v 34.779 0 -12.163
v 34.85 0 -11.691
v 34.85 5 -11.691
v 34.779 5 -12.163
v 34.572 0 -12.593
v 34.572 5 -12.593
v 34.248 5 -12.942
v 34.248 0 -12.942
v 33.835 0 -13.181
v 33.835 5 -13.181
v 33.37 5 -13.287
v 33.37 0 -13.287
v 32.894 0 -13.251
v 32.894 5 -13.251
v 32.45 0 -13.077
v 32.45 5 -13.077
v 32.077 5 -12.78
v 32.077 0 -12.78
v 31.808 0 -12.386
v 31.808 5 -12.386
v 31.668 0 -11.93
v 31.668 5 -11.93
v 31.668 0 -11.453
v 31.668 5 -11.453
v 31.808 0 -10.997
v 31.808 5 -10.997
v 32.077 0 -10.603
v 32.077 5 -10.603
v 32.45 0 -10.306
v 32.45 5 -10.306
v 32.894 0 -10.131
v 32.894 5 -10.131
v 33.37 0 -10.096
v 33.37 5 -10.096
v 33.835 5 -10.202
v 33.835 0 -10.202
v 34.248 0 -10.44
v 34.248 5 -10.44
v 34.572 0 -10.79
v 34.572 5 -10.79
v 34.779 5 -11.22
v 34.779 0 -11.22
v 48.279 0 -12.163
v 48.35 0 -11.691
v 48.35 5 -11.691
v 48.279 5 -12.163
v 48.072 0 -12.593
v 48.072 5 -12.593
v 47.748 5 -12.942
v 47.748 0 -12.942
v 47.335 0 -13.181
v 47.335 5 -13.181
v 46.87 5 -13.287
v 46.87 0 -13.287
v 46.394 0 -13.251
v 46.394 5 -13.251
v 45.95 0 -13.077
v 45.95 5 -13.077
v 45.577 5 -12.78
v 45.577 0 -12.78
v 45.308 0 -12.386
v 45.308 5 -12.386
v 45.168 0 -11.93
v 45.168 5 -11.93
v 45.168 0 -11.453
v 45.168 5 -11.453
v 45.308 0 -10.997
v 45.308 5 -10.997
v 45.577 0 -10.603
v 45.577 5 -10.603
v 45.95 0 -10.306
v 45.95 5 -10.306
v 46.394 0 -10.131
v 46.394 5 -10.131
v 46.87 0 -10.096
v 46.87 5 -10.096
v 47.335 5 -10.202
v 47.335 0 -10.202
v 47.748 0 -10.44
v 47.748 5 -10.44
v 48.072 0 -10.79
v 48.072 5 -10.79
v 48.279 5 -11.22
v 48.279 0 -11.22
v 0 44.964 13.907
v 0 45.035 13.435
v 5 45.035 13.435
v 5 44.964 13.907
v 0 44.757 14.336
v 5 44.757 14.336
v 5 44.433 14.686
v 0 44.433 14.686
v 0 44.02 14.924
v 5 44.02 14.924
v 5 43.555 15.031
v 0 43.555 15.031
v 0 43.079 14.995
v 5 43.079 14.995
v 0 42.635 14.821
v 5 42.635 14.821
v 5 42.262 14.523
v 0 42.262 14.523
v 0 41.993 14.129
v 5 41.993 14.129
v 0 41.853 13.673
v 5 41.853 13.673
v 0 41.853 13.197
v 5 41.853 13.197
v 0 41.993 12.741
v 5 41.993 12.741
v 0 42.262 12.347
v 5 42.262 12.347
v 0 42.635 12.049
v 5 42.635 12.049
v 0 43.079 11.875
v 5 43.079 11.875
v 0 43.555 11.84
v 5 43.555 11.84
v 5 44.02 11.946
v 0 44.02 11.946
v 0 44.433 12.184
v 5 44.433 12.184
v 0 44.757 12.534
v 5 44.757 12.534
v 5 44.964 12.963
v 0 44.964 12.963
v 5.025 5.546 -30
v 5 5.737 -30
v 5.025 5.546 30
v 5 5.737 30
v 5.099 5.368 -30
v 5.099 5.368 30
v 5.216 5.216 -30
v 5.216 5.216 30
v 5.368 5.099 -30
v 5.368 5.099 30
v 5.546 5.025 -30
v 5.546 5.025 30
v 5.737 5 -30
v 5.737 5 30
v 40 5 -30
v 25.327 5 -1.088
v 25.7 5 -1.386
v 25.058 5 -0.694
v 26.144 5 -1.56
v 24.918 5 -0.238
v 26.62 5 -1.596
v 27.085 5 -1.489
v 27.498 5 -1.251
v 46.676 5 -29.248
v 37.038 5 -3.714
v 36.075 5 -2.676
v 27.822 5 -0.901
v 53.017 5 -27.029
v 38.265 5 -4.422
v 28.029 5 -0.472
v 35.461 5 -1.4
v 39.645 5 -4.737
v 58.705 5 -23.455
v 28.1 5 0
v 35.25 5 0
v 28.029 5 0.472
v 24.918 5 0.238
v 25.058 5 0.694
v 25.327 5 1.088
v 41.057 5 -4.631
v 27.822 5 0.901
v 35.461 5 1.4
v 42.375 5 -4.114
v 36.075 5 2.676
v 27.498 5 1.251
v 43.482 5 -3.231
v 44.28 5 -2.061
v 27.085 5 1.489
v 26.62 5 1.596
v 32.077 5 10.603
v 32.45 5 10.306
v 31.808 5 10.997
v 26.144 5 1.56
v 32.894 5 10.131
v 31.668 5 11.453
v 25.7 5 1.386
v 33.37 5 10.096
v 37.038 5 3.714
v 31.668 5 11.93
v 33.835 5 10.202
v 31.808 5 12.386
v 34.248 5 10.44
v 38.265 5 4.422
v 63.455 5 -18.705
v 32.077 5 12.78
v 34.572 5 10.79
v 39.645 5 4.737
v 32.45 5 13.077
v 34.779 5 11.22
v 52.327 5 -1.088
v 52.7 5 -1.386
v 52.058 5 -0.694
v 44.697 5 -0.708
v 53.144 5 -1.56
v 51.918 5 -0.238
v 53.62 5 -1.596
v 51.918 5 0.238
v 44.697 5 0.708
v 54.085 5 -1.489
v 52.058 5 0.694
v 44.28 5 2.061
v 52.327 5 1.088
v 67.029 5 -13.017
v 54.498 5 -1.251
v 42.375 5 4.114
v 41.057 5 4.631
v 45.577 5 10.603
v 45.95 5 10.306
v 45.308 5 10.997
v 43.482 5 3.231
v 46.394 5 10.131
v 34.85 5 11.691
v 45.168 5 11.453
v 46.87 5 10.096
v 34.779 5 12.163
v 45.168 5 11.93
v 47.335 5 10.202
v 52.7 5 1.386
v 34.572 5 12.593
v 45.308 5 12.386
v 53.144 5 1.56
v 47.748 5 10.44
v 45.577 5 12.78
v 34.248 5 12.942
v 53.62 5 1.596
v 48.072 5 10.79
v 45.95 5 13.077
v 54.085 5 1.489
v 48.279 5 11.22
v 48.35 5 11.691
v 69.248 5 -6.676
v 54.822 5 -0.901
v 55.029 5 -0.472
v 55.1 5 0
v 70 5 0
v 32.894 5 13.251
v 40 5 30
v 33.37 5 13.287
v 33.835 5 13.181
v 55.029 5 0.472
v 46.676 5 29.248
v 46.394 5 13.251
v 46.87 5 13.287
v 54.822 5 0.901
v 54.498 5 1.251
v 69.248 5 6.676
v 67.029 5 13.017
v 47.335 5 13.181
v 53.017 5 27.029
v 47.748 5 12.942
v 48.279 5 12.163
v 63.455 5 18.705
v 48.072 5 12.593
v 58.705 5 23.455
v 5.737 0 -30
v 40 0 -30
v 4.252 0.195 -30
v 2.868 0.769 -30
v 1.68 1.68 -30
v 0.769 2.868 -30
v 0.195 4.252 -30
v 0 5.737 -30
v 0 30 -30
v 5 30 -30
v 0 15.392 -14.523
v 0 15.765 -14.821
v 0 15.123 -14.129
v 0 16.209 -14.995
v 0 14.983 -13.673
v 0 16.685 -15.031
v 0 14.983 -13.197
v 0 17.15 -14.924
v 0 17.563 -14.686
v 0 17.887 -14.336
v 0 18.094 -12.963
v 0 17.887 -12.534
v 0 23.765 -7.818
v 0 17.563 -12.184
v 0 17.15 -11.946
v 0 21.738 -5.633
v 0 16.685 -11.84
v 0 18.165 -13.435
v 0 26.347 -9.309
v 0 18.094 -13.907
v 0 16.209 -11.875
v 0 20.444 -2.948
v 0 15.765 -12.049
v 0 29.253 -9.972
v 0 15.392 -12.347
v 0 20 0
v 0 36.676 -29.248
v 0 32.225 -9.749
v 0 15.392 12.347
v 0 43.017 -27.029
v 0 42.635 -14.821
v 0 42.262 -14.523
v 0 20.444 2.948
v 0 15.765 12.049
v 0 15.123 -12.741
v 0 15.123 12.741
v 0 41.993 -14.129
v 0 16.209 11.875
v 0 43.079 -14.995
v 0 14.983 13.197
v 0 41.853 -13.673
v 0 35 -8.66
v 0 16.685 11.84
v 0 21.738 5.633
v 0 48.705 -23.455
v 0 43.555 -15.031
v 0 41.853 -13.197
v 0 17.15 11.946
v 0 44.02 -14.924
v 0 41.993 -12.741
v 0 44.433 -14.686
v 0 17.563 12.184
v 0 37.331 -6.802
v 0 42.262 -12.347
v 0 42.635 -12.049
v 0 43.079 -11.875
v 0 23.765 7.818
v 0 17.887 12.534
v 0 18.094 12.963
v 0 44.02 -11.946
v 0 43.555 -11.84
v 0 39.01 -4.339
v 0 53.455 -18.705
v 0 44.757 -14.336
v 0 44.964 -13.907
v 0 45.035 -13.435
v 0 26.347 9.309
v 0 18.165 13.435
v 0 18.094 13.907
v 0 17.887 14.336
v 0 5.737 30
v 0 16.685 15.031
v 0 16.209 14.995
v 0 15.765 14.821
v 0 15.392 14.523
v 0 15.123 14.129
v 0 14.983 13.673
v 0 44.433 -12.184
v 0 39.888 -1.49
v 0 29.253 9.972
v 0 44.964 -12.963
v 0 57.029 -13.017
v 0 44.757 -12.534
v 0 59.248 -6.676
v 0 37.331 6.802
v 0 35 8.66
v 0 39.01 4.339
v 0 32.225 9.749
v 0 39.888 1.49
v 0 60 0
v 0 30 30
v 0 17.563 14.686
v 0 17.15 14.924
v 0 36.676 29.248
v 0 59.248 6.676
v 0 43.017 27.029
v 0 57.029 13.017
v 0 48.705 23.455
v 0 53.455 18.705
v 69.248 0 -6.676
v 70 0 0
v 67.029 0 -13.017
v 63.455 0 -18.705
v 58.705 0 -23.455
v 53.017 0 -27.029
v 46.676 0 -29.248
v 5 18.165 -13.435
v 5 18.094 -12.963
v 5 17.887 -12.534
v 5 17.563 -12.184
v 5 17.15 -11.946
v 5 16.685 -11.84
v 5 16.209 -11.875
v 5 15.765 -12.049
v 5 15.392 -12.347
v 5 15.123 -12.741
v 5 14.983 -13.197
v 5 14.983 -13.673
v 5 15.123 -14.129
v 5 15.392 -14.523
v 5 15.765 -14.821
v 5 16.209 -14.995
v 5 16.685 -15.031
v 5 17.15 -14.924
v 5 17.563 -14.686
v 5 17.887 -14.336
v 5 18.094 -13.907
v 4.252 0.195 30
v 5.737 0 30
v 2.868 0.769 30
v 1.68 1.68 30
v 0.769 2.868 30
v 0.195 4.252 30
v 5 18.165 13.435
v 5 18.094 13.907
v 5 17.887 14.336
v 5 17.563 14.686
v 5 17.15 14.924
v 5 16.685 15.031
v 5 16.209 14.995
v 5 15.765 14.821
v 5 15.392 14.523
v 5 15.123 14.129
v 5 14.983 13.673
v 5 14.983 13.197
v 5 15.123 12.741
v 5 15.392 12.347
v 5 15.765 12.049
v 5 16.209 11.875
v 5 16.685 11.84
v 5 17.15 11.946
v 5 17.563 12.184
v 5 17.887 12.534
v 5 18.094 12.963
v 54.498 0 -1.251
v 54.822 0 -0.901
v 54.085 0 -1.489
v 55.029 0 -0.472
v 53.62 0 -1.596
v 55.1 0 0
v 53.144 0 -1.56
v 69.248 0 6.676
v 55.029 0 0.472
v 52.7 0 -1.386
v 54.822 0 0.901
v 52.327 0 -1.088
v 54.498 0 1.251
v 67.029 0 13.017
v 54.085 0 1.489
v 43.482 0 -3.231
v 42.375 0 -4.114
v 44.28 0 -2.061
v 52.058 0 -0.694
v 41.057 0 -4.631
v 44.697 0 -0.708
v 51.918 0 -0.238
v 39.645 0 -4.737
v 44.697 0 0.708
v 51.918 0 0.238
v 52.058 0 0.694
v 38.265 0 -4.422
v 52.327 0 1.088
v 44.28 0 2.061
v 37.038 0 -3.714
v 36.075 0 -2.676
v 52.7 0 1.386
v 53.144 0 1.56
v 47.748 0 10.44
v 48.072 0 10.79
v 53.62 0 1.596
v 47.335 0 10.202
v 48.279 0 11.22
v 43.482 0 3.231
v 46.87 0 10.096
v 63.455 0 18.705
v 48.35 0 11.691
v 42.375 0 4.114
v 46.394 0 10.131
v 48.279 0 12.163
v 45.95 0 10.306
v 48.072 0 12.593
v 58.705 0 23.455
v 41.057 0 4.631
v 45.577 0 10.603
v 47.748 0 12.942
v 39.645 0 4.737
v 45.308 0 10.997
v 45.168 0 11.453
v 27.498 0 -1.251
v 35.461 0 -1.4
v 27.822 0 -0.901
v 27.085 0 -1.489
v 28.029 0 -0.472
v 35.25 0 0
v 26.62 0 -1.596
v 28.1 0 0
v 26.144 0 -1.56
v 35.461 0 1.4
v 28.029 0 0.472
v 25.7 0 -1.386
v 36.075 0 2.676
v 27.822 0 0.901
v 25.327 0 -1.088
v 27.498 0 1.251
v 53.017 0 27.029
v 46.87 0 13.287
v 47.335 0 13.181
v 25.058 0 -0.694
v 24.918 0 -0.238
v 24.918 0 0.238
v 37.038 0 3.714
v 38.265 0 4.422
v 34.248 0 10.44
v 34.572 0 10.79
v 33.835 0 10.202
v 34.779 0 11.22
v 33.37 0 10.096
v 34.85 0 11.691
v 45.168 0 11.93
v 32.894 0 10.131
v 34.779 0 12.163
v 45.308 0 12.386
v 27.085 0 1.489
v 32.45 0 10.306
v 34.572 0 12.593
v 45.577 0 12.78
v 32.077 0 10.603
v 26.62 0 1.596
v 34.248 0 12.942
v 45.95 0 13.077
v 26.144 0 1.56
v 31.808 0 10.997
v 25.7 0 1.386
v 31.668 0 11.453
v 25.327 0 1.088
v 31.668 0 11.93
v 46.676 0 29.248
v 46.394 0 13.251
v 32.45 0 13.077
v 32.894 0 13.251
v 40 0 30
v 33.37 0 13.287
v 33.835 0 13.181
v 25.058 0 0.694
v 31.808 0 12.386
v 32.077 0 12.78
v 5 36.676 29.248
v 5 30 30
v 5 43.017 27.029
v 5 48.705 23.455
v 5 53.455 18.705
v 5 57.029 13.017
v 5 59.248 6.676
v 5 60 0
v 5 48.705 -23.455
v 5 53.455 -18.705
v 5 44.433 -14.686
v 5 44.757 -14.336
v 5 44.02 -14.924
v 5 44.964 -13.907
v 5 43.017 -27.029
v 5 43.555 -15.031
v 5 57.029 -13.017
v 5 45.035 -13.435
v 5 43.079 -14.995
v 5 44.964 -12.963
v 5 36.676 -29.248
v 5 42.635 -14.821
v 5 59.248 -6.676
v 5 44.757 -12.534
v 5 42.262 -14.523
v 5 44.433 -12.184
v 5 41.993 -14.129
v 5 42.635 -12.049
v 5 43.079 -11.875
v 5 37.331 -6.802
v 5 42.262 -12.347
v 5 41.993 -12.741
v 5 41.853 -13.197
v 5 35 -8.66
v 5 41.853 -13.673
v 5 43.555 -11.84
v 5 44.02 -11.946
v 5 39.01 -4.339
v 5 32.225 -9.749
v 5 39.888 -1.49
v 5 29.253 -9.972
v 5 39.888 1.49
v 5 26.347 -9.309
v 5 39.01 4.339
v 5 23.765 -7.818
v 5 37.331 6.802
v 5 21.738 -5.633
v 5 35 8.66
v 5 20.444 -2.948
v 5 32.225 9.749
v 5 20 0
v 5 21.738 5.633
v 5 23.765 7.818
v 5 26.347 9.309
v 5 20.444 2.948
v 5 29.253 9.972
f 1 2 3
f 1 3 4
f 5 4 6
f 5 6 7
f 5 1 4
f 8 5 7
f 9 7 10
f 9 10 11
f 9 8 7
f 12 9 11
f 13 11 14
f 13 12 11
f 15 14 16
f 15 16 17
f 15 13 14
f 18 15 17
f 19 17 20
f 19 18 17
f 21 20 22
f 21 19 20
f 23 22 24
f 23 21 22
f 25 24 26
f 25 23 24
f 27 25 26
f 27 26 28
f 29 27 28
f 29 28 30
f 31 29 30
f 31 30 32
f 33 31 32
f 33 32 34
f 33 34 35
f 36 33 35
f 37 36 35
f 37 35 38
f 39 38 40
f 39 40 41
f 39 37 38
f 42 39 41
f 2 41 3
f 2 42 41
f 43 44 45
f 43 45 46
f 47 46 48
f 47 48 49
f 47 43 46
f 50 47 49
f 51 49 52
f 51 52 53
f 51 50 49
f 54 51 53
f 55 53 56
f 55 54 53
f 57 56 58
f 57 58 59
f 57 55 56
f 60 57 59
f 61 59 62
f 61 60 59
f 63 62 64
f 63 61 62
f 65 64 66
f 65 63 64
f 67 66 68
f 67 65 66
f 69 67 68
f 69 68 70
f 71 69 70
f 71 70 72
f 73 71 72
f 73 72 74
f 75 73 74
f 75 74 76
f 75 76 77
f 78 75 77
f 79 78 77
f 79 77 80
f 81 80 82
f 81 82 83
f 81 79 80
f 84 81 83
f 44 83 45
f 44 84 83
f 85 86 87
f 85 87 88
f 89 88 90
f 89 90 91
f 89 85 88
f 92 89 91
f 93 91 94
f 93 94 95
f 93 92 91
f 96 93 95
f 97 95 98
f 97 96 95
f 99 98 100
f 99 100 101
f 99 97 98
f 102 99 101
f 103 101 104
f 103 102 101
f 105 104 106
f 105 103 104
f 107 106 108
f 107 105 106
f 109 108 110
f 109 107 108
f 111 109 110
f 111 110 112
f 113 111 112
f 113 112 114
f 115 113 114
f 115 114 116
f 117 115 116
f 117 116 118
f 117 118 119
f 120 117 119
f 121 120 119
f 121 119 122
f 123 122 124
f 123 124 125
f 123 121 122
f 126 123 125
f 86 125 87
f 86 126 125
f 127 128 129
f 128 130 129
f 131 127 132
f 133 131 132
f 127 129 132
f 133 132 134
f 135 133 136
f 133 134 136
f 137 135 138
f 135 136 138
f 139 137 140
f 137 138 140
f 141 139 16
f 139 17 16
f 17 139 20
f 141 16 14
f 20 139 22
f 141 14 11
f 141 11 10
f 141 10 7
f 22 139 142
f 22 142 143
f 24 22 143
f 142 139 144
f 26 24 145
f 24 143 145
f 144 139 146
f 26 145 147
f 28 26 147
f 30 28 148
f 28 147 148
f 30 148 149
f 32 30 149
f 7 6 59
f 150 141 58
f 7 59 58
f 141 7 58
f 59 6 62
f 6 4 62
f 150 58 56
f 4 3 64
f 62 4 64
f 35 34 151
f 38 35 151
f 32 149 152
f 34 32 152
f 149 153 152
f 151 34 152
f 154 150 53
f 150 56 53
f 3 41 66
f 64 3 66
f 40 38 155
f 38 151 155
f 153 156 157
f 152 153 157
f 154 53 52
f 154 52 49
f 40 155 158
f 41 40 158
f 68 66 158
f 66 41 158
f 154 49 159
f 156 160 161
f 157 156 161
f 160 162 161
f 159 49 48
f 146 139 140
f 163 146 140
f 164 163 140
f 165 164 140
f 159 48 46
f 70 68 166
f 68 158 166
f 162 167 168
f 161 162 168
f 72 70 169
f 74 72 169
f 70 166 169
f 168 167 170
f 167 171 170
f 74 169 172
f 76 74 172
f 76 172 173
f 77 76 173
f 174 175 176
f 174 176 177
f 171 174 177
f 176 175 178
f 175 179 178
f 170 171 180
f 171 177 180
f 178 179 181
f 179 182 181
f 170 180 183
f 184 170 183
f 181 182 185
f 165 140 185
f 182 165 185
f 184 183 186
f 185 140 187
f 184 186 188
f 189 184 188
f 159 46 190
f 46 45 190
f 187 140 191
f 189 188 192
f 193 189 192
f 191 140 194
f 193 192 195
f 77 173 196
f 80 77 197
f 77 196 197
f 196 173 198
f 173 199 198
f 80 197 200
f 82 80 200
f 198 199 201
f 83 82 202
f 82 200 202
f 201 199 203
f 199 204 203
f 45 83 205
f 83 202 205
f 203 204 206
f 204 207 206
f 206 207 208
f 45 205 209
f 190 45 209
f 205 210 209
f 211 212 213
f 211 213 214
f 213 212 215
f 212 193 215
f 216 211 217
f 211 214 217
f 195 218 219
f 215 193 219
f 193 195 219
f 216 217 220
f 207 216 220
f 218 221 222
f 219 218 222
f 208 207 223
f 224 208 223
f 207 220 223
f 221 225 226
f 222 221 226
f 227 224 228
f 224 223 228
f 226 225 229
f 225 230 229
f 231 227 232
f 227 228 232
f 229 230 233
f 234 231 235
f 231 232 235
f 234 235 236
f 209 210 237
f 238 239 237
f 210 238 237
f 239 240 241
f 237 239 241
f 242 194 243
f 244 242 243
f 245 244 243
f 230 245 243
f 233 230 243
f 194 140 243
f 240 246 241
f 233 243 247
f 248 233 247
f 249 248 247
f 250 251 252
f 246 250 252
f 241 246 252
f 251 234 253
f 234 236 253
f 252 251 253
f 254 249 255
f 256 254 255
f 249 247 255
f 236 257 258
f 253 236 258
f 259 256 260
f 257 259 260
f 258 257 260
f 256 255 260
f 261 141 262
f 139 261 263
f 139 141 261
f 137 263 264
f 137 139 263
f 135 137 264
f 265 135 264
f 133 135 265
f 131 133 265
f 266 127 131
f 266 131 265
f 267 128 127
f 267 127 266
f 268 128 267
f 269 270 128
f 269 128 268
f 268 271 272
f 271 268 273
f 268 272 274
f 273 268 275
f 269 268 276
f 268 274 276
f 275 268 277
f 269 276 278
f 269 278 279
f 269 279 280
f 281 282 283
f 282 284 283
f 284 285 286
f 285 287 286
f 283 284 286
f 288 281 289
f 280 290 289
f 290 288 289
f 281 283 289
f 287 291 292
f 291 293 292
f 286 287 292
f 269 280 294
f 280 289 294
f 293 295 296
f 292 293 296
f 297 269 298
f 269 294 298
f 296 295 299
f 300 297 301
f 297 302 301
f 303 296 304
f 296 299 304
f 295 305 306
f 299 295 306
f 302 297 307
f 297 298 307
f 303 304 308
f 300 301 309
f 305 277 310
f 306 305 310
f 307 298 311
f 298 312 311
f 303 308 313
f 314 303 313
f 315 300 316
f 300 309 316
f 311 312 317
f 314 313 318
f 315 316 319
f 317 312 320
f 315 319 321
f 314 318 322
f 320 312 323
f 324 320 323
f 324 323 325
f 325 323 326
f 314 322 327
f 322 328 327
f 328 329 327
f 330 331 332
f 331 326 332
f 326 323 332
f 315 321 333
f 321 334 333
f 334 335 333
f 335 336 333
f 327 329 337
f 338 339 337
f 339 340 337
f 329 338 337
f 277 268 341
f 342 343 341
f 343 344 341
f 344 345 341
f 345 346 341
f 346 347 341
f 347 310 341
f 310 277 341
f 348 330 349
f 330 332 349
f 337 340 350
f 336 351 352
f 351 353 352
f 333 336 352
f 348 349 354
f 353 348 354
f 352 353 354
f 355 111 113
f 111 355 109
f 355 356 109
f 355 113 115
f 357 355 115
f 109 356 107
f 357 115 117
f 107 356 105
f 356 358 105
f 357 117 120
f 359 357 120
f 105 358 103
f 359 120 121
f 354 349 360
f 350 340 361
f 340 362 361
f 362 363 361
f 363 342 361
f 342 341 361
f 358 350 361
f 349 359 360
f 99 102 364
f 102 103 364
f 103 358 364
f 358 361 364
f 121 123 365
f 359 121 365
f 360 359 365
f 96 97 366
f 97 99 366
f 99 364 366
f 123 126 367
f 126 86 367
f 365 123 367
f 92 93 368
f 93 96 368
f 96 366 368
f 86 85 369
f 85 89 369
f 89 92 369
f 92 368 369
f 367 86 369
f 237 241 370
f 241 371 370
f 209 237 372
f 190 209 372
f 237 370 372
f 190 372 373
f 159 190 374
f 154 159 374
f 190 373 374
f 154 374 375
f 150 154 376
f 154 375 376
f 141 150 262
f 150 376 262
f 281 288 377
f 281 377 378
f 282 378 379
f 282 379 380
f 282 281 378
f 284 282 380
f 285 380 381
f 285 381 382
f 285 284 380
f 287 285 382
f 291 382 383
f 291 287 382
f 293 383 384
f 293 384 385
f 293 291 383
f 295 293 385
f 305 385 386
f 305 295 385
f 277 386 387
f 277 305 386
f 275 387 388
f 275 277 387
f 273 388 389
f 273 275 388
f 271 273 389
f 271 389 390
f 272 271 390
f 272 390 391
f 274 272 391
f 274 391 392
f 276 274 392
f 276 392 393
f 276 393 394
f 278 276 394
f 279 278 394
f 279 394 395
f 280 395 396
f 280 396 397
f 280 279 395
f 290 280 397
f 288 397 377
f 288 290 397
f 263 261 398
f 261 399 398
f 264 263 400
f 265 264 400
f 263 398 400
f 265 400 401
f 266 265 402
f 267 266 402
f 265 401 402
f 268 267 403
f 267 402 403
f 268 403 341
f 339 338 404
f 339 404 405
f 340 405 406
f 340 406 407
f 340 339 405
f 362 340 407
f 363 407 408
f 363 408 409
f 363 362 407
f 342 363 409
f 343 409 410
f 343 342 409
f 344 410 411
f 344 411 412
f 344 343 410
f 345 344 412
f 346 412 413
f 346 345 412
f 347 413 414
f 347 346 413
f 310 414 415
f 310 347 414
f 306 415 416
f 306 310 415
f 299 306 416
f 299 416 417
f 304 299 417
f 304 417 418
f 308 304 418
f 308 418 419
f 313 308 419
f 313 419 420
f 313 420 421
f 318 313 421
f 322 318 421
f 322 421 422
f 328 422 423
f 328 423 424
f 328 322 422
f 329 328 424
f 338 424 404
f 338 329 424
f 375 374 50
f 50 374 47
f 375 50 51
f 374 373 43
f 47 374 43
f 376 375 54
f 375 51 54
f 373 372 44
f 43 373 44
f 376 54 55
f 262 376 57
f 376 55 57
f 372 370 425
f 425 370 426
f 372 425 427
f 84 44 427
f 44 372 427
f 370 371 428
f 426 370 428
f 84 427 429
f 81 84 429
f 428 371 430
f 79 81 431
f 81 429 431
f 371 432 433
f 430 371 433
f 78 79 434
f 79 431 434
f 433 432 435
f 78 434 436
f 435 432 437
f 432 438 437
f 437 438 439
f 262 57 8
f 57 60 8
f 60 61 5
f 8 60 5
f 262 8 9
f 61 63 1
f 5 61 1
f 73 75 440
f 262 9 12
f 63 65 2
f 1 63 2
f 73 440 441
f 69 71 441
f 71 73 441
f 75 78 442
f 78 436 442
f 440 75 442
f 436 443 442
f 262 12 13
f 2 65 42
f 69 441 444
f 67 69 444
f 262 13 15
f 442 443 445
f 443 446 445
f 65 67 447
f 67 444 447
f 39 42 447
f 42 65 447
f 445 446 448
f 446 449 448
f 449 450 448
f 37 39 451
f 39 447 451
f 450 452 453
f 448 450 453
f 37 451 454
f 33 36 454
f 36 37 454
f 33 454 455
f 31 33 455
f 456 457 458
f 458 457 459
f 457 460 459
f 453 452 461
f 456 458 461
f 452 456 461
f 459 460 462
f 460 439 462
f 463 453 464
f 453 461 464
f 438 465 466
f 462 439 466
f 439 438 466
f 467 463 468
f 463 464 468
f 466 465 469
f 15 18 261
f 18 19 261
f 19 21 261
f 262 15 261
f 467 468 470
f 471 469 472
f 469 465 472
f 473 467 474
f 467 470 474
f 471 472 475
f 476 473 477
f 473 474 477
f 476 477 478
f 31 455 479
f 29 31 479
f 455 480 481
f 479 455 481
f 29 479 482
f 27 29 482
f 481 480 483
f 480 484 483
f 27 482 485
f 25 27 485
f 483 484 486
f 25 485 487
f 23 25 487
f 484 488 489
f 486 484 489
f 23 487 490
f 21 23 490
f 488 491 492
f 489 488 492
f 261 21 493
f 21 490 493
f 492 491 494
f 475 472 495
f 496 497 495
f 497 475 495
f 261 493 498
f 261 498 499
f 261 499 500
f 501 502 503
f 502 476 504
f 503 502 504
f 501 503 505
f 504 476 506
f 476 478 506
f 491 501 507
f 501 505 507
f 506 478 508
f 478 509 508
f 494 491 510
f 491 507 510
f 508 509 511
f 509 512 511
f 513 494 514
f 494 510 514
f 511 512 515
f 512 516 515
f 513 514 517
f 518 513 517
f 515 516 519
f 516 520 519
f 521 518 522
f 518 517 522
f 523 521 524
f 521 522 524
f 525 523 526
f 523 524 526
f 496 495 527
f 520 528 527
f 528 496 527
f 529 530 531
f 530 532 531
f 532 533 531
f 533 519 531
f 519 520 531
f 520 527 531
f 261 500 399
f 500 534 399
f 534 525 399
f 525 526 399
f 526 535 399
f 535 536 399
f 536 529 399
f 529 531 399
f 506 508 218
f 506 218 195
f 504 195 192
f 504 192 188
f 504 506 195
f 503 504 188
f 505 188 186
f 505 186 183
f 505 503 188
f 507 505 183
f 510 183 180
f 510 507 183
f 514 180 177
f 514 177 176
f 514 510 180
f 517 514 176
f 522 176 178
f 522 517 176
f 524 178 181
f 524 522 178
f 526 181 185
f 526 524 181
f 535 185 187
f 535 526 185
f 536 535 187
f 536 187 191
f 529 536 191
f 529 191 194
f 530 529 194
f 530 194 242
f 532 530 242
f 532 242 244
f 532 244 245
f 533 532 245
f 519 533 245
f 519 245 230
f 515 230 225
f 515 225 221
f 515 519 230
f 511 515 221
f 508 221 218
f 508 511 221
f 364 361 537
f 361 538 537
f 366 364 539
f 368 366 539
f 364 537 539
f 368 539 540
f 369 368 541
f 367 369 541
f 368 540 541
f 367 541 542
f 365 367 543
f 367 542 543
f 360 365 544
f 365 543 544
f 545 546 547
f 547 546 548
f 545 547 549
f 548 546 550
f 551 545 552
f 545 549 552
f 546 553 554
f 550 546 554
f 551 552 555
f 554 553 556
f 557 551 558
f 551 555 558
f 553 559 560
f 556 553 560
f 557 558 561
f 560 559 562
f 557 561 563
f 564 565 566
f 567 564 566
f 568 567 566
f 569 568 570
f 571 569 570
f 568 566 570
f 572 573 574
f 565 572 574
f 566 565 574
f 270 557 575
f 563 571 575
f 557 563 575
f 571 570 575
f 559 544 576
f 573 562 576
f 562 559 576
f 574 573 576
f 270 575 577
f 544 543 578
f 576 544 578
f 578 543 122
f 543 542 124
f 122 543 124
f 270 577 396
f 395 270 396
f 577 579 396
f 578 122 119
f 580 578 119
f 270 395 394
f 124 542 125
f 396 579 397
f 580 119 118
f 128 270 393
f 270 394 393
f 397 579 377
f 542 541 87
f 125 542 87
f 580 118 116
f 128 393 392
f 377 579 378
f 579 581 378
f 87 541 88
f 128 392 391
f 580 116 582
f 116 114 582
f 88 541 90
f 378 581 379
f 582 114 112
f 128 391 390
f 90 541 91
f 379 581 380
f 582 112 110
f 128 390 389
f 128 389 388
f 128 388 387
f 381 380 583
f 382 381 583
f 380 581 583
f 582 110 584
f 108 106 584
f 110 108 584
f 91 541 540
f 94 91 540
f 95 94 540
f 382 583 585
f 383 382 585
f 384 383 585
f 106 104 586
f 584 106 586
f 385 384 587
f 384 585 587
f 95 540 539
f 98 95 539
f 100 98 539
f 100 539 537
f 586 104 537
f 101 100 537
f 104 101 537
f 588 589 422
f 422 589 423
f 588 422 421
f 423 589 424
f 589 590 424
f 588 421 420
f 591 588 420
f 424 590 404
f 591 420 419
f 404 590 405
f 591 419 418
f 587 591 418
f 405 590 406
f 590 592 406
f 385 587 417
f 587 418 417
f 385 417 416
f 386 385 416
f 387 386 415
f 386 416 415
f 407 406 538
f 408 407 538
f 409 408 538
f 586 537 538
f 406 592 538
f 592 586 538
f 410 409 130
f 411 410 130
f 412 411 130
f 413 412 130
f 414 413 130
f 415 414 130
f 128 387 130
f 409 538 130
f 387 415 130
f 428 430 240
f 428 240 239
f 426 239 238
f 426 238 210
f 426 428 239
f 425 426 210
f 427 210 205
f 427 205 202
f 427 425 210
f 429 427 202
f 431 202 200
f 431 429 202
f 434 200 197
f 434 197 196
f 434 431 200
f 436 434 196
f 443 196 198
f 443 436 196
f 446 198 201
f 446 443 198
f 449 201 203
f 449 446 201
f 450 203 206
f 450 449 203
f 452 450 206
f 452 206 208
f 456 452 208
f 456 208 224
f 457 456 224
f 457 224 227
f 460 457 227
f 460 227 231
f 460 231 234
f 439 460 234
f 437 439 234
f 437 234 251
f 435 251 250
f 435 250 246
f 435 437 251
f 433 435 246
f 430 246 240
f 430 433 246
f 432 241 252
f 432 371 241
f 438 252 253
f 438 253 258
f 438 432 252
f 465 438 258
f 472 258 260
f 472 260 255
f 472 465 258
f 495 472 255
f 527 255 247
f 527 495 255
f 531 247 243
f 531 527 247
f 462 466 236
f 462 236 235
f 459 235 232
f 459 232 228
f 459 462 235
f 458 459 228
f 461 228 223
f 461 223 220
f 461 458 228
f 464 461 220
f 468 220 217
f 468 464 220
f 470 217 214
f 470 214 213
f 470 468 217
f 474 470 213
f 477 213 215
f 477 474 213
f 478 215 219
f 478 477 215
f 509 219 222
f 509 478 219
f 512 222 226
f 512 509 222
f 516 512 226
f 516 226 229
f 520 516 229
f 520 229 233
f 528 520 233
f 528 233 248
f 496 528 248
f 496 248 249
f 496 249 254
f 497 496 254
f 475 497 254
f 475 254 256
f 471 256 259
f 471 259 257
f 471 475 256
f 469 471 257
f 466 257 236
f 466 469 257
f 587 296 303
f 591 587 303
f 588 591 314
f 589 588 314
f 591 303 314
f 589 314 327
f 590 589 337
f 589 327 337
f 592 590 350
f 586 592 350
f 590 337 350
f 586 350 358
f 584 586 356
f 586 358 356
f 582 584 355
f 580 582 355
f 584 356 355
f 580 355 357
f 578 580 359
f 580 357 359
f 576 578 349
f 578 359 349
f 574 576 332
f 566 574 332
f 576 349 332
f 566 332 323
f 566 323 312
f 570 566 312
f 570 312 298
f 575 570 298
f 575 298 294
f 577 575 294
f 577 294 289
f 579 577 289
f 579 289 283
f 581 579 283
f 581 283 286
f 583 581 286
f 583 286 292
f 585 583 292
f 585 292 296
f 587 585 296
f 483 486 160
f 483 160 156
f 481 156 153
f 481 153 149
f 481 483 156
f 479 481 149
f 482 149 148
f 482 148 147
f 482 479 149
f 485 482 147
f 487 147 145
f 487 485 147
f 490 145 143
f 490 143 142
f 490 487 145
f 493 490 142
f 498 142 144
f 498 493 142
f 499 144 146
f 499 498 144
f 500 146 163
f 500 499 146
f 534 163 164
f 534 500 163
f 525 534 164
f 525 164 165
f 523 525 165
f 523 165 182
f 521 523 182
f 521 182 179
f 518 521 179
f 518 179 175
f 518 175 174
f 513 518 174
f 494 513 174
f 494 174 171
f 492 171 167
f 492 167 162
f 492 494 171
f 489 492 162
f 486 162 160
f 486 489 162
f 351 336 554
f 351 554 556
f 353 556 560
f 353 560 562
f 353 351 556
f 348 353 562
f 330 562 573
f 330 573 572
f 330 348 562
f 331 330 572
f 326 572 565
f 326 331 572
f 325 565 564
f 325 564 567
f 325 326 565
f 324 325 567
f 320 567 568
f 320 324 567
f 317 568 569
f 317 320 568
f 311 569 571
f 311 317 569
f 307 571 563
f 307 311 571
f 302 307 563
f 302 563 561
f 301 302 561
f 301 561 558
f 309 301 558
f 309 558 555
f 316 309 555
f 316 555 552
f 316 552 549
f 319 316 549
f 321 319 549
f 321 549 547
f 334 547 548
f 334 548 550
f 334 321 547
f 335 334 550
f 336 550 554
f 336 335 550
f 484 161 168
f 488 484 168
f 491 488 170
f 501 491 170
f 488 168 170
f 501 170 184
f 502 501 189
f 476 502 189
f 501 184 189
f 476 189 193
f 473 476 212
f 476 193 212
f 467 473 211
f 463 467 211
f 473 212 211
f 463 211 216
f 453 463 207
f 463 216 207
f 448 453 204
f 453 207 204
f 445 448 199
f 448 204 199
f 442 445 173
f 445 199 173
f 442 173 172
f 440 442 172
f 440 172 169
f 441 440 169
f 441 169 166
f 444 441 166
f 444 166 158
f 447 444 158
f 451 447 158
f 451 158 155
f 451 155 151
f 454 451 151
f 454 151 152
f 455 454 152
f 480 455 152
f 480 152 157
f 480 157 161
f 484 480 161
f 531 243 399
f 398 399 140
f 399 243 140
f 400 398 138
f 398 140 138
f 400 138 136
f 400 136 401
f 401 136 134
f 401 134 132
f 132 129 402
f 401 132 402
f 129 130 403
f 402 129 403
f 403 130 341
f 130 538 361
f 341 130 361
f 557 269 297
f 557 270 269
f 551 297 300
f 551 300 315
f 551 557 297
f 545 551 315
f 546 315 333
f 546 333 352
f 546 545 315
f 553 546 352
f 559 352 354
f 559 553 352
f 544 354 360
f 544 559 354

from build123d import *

# Parameters (mm, degrees)
SM_BASE_FLANGE_1_DEPTH  = 30
SKETCH_2_R              = 4.75
CUT_EXTRUDE_1_DEPTH     = 10
HOLE_WIZARD_1_OUTLINE_R = 1.6
HOLE_WIZARD_1_DEPTH     = 5
SKETCH_5_R              = 10
CUT_EXTRUDE_2_DEPTH     = 10
HOLE_WIZARD_2_OUTLINE_R = 1.6
HOLE_WIZARD_2_DEPTH     = 5
FILLET_1_R              = 30


# Read off the part's stored shape, not the designer's step: 孔1, 孔2
# Sheet-metal steps are written as plain solids
with BuildPart() as part:
    # Sketch 1 → 基体-法兰1 (new, symmetric)
    with BuildSketch(Plane.XY):
        with BuildLine():
            Line((70, 0), (5.7366, 0))
            ThreePointArc((5.7366, 0), (1.680211239, 1.680211239), (0, 5.7366))
            Line((0, 5.7366), (0, 60))
            Line((0, 60), (5, 60))
            Line((5, 60), (5, 5.7366))
            ThreePointArc((5, 5.7366), (5.215745145, 5.215745145), (5.7366, 5))
            Line((5.7366, 5), (70, 5))
            Line((70, 5), (70, 0))
        make_face()
    extrude(amount=SM_BASE_FLANGE_1_DEPTH, both=True)

    # Sketch 2 → 切除-拉伸1 (cut)
    with BuildSketch(Plane(origin=(0, 5, 0), x_dir=(1, 0, 0), z_dir=(0, 1, 0))):
        with Locations(Location((40, 0, 0), (0, 0, 180))):
            Circle(SKETCH_2_R)
    extrude(amount=-CUT_EXTRUDE_1_DEPTH, mode=Mode.SUBTRACT)

    # 孔1 outline → 孔1 (cut)
    with BuildSketch(Plane(origin=(0, 0, 0), x_dir=(1, 0, 0), z_dir=(0, 1, 0))):
        with Locations((33.25, -11.691342951)):
            Circle(HOLE_WIZARD_1_OUTLINE_R)
        with Locations((26.5, 0)):
            Circle(HOLE_WIZARD_1_OUTLINE_R)
        with Locations((33.25, 11.691342951)):
            Circle(HOLE_WIZARD_1_OUTLINE_R)
        with Locations((46.75, 11.691342951)):
            Circle(HOLE_WIZARD_1_OUTLINE_R)
        with Locations((53.5, 0)):
            Circle(HOLE_WIZARD_1_OUTLINE_R)
        with Locations((46.75, -11.691342951)):
            Circle(HOLE_WIZARD_1_OUTLINE_R)
    extrude(amount=HOLE_WIZARD_1_DEPTH, mode=Mode.SUBTRACT)

    # 草图5 → 切除-拉伸2 (cut)
    with BuildSketch(Plane.ZY):
        with Locations(Location((0, 30, 0), (0, 0, 270))):
            Circle(SKETCH_5_R)
    extrude(amount=-CUT_EXTRUDE_2_DEPTH, mode=Mode.SUBTRACT)

    # 孔2 outline → 孔2 (cut)
    with BuildSketch(Plane.YZ):
        with Locations((16.564971157, 13.435028843)):
            Circle(HOLE_WIZARD_2_OUTLINE_R)
        with Locations((16.564971157, -13.435028843)):
            Circle(HOLE_WIZARD_2_OUTLINE_R)
        with Locations((43.435028843, -13.435028843)):
            Circle(HOLE_WIZARD_2_OUTLINE_R)
        with Locations((43.435028843, 13.435028843)):
            Circle(HOLE_WIZARD_2_OUTLINE_R)
    extrude(amount=HOLE_WIZARD_2_DEPTH, mode=Mode.SUBTRACT)

    # 圆角1
    fillet_1_edges = [part.edges().sort_by_distance(p)[0] for p in [
        (70, 2.5, -30),
        (70, 2.5, 30),
        (2.5, 60, -30),
        (2.5, 60, 30),
    ]]
    fillet(fillet_1_edges, radius=FILLET_1_R - 0.0001)  # a hair under: the kernel refuses the full size


solid = part.part
